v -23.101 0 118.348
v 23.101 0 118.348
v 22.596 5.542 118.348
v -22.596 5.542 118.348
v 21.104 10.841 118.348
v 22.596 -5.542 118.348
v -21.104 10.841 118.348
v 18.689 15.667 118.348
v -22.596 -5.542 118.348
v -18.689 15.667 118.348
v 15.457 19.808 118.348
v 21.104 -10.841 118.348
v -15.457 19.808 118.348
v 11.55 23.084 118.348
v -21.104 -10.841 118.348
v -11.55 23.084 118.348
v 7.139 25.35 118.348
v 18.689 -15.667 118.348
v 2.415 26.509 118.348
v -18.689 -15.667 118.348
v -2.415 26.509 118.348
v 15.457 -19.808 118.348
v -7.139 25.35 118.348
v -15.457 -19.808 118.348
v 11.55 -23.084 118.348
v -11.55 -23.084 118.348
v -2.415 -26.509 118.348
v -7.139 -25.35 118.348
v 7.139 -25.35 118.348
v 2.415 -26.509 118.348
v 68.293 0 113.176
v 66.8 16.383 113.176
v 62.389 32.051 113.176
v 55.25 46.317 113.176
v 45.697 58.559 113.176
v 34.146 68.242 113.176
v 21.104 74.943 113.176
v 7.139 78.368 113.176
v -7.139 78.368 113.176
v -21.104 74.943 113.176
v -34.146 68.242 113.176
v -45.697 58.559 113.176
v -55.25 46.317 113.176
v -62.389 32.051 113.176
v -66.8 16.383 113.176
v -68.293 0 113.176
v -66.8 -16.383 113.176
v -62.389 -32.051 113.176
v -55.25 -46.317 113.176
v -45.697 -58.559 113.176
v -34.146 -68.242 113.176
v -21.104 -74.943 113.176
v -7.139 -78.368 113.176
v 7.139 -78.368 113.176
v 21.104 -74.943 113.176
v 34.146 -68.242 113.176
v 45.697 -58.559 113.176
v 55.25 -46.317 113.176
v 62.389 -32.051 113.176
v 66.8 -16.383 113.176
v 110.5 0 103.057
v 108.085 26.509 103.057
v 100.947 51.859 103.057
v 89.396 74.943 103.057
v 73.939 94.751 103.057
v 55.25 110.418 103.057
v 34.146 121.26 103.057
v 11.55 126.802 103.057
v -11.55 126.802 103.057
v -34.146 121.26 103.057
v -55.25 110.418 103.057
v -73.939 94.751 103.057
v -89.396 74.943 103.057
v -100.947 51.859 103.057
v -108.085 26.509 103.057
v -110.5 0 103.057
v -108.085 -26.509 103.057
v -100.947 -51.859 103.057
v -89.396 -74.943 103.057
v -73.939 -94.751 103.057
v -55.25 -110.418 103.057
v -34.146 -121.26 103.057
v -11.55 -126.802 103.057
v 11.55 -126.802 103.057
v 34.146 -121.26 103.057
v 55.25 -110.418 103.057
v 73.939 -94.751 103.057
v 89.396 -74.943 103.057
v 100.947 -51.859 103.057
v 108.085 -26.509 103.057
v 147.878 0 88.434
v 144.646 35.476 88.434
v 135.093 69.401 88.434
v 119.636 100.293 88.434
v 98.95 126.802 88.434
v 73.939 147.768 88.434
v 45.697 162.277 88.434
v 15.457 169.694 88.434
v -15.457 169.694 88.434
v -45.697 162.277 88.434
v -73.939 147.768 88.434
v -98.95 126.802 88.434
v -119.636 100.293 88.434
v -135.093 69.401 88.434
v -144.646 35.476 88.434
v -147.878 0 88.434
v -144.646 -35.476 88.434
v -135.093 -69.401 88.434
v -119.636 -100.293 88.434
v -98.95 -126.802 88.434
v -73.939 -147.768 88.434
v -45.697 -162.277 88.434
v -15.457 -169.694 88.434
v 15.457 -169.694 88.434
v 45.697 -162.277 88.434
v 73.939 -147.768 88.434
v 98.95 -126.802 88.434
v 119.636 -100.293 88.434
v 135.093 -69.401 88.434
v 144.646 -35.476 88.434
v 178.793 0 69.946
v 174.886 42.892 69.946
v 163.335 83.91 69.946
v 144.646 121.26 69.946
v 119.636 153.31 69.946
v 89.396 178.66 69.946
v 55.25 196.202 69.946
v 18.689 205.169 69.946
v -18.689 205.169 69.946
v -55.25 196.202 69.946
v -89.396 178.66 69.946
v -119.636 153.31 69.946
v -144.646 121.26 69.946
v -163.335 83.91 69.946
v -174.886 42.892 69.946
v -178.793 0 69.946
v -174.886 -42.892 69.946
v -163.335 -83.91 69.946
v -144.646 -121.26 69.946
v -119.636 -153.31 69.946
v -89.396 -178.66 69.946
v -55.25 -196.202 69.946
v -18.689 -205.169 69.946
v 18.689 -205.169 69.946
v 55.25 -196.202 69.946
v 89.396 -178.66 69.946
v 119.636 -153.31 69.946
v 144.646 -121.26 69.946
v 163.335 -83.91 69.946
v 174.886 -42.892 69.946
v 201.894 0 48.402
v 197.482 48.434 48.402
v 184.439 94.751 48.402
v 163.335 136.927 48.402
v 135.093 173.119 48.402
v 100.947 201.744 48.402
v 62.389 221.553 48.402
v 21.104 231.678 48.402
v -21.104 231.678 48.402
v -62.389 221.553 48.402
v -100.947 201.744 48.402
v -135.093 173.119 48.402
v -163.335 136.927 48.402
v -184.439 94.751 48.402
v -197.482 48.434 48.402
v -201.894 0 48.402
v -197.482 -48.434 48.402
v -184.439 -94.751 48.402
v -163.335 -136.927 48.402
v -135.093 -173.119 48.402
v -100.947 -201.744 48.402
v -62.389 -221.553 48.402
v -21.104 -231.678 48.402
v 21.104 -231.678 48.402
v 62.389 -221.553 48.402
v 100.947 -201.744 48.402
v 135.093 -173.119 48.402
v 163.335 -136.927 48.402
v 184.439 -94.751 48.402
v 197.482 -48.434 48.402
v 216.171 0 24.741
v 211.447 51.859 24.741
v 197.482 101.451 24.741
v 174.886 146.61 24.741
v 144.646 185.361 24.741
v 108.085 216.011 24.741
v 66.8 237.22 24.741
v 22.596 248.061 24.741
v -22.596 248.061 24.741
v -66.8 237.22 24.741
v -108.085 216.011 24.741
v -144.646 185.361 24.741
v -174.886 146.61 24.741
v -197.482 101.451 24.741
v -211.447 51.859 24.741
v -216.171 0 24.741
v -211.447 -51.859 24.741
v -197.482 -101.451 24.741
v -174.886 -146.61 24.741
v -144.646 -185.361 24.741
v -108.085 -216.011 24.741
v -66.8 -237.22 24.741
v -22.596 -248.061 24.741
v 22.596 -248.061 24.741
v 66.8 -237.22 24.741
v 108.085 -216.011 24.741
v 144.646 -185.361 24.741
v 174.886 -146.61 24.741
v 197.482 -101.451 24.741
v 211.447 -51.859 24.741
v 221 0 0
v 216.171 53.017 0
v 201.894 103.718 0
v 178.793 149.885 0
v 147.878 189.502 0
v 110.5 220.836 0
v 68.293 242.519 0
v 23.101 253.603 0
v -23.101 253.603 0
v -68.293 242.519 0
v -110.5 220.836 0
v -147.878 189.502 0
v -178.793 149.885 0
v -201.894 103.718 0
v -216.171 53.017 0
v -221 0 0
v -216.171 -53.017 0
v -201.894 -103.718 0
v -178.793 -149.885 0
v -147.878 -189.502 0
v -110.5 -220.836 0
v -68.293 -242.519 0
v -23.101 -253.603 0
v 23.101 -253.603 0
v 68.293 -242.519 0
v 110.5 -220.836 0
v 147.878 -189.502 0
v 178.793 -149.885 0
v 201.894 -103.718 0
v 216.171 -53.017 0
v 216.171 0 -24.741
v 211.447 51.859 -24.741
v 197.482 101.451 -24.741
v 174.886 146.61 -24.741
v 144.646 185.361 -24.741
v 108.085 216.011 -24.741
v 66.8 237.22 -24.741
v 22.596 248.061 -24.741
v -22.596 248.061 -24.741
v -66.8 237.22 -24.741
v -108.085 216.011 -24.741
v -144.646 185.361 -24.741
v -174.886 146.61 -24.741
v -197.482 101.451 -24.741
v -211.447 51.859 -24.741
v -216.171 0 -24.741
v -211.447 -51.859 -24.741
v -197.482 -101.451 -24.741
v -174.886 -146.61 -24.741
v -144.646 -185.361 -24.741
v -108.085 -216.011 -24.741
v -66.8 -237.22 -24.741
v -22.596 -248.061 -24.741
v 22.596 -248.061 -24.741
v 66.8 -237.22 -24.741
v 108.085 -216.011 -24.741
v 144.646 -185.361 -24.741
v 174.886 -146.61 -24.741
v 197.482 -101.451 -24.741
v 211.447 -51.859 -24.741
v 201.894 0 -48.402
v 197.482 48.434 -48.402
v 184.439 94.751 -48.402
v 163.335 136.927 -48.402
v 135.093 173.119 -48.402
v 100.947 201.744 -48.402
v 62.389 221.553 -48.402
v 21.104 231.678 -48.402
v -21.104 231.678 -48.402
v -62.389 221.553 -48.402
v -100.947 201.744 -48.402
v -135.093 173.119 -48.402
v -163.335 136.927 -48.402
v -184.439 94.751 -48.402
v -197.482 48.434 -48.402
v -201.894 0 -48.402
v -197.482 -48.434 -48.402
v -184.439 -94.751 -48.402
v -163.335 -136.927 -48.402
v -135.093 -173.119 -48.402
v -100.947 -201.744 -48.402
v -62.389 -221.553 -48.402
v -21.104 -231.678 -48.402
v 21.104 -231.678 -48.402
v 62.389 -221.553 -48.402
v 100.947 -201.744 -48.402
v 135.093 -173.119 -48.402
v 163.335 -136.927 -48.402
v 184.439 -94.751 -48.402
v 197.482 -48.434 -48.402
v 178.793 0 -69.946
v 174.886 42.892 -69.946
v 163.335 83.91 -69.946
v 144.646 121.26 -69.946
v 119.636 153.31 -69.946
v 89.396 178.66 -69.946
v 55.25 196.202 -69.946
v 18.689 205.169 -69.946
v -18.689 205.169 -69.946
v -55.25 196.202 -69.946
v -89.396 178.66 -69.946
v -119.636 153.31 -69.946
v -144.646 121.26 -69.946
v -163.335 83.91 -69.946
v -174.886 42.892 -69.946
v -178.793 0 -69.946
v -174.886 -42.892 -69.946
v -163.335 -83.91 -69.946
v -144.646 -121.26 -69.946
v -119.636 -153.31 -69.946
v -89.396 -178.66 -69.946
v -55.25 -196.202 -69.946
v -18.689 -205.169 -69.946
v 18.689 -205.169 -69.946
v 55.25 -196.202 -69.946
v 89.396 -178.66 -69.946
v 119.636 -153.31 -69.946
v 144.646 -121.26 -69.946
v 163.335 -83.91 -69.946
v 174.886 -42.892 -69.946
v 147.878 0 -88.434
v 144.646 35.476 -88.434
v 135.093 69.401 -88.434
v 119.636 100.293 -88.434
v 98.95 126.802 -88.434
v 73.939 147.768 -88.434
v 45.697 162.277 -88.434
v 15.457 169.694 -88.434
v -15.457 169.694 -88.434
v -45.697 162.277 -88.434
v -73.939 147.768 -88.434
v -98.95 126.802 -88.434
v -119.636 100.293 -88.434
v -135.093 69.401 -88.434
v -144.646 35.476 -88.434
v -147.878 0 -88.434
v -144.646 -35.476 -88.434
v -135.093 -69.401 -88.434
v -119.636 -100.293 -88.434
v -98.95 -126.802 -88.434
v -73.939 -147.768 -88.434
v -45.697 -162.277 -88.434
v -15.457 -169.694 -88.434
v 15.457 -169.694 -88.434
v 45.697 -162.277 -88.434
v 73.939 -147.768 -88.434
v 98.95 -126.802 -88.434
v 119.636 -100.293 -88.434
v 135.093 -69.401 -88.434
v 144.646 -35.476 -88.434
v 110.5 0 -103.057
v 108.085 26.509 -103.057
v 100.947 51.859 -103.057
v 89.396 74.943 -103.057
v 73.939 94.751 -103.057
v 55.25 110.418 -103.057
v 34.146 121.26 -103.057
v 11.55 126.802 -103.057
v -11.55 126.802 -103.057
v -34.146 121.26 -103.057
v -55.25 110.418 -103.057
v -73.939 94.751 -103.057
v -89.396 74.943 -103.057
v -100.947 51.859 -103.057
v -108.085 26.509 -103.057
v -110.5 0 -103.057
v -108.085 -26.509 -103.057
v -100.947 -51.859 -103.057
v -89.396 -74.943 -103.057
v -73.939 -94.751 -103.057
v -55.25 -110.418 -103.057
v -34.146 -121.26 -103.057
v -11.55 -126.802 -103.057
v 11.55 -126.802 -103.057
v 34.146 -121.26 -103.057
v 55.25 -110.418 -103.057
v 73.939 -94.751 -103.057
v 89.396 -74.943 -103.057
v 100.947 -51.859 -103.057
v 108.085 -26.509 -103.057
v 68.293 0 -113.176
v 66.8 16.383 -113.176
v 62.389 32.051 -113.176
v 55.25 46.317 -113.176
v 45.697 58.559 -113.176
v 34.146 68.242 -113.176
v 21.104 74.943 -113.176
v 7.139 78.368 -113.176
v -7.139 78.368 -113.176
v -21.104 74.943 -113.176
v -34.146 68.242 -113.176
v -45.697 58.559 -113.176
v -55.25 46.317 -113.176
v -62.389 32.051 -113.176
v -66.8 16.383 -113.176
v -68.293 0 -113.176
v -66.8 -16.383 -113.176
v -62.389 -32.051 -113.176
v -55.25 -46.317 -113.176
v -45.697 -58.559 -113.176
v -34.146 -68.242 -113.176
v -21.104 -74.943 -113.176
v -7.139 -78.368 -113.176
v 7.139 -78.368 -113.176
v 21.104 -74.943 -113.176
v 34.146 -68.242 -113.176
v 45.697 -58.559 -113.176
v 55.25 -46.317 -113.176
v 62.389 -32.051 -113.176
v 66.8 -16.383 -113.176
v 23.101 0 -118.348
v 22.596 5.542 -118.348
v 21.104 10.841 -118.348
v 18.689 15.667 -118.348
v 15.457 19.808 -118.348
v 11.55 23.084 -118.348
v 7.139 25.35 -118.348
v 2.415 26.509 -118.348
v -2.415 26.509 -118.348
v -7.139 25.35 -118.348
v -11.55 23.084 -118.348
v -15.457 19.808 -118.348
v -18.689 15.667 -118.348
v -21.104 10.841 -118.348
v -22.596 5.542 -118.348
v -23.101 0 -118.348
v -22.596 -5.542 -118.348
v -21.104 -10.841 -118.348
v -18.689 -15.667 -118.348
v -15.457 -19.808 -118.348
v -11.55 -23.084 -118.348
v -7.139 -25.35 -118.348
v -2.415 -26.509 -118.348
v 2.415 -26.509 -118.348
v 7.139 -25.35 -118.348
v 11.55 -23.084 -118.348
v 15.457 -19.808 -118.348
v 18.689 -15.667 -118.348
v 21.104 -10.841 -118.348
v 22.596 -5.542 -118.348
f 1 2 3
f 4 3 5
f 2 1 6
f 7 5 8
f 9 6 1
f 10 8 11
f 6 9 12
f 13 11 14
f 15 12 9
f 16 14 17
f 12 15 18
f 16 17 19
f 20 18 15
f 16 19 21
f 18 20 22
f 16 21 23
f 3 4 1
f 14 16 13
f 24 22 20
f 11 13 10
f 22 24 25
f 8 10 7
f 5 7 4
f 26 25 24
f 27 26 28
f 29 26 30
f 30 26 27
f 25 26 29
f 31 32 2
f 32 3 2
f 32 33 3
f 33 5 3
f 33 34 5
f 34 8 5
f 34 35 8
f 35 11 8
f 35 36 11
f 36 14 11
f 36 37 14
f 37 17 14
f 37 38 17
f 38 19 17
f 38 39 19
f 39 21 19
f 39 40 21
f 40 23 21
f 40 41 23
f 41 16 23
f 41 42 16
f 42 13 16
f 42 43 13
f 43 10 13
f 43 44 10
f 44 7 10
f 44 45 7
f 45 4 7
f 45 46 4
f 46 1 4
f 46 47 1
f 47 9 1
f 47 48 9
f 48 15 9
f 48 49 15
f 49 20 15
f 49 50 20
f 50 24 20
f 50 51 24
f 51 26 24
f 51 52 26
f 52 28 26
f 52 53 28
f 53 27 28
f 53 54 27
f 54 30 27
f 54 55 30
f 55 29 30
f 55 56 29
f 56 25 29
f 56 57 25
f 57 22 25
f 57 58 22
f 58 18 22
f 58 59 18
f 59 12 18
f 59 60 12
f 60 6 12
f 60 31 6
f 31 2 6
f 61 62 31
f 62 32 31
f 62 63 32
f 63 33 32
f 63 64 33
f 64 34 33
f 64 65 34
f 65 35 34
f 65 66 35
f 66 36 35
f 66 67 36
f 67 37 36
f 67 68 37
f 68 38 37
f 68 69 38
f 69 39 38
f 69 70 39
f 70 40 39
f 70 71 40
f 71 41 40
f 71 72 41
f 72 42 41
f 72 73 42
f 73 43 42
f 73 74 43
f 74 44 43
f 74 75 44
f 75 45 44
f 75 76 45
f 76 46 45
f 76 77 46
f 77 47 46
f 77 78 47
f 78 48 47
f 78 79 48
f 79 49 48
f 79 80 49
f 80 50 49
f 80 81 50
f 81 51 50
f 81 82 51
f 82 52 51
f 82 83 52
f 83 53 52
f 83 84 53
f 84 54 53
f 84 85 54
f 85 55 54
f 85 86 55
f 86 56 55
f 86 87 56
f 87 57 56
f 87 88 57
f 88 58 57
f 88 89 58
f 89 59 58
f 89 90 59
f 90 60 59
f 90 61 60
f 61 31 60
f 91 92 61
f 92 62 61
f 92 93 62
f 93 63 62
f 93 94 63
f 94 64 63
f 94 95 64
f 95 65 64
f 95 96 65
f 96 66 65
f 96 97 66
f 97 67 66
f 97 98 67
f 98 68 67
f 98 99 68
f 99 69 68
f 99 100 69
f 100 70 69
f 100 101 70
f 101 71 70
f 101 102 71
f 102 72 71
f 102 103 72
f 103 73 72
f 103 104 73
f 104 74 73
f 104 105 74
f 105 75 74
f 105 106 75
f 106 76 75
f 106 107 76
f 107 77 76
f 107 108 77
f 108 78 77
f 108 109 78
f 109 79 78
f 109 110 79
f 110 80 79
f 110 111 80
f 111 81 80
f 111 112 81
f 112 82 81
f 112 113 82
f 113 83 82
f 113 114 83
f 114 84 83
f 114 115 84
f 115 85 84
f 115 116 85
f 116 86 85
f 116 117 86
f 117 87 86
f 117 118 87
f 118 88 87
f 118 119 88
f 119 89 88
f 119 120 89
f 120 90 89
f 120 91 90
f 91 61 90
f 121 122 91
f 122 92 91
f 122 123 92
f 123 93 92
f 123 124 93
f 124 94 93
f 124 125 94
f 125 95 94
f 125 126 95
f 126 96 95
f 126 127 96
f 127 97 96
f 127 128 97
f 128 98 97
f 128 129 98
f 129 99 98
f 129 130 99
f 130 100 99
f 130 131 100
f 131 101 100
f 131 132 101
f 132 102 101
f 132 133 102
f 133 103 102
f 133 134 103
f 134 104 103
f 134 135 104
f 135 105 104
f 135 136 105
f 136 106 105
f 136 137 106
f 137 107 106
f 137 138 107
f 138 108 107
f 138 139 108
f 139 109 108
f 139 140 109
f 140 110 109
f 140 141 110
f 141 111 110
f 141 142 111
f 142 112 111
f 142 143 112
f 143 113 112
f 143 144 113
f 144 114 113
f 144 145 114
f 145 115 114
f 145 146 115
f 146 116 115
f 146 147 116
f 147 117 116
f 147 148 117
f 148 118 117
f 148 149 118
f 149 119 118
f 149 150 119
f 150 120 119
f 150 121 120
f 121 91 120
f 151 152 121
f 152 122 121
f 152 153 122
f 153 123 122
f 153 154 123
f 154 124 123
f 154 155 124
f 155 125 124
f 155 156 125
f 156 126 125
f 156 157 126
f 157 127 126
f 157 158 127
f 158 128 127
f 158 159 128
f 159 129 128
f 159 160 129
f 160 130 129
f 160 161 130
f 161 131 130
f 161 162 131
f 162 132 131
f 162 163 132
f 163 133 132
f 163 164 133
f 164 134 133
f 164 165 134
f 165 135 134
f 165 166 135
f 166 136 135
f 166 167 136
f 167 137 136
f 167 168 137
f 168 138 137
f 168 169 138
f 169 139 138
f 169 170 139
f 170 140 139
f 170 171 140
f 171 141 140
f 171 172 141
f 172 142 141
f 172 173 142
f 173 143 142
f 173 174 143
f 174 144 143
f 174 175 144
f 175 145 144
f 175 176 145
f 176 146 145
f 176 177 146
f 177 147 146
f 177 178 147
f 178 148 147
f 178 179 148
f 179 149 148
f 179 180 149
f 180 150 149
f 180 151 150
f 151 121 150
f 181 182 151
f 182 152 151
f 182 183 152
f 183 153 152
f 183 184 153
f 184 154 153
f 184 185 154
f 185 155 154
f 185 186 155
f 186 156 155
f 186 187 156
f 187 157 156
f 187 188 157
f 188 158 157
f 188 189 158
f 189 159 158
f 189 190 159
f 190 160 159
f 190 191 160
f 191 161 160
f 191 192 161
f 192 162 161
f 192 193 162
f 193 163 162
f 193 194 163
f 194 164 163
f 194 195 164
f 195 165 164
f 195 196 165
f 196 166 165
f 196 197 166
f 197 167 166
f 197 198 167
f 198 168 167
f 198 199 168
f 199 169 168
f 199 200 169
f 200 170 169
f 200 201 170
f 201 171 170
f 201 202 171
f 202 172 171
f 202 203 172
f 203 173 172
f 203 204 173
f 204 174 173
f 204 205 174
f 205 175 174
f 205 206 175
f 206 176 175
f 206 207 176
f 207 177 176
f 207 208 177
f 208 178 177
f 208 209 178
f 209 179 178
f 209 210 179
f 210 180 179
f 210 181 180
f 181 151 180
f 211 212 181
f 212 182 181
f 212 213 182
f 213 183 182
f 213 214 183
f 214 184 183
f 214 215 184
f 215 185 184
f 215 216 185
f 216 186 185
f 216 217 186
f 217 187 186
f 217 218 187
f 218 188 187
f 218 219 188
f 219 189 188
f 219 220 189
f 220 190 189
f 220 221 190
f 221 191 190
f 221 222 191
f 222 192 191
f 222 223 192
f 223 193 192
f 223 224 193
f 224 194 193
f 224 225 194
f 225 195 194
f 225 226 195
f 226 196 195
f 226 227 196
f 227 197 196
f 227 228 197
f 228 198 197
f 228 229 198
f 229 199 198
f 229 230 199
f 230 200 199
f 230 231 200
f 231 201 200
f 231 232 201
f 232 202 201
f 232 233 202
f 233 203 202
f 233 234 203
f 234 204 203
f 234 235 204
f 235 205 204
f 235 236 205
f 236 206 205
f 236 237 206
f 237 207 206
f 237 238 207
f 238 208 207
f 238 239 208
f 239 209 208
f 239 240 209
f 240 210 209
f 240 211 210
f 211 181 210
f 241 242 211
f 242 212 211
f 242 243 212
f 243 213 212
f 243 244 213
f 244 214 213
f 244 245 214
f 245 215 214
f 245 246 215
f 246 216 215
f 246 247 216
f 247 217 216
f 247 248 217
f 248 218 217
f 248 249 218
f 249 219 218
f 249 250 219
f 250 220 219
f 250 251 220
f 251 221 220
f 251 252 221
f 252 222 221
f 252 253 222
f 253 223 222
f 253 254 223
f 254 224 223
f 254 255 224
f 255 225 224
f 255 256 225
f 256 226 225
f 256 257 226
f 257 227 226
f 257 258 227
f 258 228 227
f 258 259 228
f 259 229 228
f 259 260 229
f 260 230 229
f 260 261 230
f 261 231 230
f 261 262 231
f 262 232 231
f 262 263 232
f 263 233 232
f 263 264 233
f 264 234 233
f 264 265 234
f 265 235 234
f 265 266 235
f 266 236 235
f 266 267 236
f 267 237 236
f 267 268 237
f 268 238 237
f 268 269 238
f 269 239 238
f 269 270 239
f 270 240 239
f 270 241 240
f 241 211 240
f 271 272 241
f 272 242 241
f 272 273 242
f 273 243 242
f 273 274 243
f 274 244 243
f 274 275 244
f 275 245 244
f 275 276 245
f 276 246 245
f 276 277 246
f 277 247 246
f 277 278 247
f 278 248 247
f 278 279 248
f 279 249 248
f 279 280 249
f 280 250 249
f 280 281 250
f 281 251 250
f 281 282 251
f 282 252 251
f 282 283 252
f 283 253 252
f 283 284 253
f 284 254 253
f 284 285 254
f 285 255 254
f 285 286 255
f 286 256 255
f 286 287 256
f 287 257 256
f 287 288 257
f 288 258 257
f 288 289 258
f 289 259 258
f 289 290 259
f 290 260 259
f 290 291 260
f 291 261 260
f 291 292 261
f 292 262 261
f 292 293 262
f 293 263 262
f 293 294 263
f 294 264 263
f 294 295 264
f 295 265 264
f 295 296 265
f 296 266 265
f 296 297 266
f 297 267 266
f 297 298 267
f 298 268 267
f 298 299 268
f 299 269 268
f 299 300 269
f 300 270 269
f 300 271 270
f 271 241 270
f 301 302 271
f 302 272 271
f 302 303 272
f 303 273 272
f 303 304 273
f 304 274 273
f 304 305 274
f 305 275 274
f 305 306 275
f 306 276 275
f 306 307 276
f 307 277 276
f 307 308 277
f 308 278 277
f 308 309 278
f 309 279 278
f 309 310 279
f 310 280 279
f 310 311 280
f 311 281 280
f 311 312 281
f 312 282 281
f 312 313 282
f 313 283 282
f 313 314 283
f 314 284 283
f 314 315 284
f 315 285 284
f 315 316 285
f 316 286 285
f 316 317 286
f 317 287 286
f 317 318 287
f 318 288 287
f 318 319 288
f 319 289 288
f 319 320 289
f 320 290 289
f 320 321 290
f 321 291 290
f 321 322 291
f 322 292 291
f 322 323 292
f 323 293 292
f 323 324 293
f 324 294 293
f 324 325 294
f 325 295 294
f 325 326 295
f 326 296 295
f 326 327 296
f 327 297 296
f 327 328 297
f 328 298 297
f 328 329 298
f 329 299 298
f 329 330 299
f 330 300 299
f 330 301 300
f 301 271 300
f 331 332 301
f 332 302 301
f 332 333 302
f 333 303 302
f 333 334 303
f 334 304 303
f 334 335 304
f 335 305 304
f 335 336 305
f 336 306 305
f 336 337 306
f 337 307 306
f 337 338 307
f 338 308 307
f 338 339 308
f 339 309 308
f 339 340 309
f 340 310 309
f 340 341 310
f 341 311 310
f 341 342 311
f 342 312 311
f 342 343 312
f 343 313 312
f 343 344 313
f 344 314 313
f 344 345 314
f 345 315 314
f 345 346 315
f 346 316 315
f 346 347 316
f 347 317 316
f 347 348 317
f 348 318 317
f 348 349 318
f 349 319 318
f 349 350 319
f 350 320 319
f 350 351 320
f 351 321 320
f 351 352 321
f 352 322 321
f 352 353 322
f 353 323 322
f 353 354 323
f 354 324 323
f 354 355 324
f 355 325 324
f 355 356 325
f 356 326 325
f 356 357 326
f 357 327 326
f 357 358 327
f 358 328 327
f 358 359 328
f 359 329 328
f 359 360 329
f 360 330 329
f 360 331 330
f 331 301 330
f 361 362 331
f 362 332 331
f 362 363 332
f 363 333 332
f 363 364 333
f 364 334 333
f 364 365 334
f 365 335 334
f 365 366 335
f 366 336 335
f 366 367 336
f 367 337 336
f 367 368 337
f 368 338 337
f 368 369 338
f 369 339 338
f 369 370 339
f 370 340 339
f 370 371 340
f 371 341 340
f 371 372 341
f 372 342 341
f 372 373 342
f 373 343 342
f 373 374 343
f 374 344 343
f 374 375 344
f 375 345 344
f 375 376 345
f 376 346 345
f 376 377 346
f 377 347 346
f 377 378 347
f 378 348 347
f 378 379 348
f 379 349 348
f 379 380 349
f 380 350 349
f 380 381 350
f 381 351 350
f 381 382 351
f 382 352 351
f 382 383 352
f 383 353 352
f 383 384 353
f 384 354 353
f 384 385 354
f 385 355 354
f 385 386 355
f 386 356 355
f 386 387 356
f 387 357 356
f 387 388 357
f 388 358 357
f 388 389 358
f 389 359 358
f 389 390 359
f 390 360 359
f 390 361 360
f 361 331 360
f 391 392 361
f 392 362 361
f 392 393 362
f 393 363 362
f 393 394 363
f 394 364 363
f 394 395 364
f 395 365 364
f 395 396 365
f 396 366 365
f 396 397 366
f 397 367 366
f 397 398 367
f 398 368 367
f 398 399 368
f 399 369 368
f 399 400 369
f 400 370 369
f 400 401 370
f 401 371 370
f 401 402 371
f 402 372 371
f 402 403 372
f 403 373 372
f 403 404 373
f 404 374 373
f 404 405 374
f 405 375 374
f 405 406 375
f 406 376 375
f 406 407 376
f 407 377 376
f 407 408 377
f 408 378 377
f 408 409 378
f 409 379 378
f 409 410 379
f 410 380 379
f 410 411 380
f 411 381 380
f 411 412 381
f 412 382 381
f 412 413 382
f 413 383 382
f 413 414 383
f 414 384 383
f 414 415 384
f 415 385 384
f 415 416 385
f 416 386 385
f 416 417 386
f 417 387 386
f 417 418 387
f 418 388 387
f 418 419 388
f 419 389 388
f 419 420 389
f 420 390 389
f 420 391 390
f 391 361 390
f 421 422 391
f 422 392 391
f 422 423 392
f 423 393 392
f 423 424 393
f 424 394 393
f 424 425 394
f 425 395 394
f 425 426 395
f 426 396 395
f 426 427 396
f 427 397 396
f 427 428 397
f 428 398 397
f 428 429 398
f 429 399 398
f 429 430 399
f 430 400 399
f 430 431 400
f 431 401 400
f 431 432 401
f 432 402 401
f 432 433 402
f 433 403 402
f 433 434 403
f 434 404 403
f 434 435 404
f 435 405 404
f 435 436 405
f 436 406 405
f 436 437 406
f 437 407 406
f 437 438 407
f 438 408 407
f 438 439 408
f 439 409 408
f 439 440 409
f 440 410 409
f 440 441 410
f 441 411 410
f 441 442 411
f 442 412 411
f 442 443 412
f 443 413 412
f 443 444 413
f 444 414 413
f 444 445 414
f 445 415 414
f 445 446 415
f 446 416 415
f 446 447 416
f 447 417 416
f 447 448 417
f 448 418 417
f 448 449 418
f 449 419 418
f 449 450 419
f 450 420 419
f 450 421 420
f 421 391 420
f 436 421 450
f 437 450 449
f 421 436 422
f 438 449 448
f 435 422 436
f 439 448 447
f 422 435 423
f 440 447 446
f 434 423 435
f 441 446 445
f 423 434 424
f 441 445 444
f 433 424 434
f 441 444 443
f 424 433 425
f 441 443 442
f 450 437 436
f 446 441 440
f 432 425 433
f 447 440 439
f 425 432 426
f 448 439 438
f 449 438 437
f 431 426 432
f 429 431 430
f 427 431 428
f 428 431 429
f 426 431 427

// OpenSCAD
// Generated by SolidPython 1.0.1 on 2020-07-29 00:46:51


scale(v = [13, 15, 7]) {
	sphere(r = 17);
}
/***********************************************
*********      SolidPython code:      **********
************************************************
 
# import packages: SolidPython
from solid import *
from solid.utils import *
from itertools import chain, combinations, permutations


class Resize:

    def __init__(self, scad_file):
        self.scad_file = scad_file
        #self.scad_file = import_scad(scad_file)
        # cone/cylinder param:
        self.r1 = 0
        self.r2 = 0
        self.h = 0
        # rectangular prism param:
        self.w = 0
        self.l = 0
        # ellipse param:
        self.r = 0

    # import OpenScad code (file name corresponds to shape)


    # classify shape + parameters
    def assign(self, param1, param2, param3):
        if self.scad_file == 'cone.scad':
            self.r1 = param1
            self.r2 = param2
            self.h = param3
        elif self.scad_file == 'cylinder.scad':
            self.r1 = param1
            self.r2 = param2
            self.h = param3
        elif self.scad_file == 'rectangularPrism.scad':
            self.h = param1
            self.l = param2
            self.w = param3
        else:
            self.r = param1
            self.h = param2

    # resize parameters
    def iterate(self):
        x = range(3, 20, 2)
        i = 1
        if self.scad_file == 'cone.scad':
            tempList = list(permutations(x, 2))
            for temp in tempList:
                param1 = temp[0]
                param2 = temp[1]
                filepath = 'produced_scad_files/' + 'cone' + str(param1) + '_' + str(param2) + '_' + '.scad'
                scad_render_to_file(cylinder(h=param1, r1=param2, r2=0), filepath)

        elif self.scad_file == 'cylinder.scad':
            tempList = list(permutations(x, 3))
            for temp in tempList:
                param1 = temp[0]
                param2 = temp[1]
                filepath = 'produced_scad_files/' + 'cylinder' + str(param1) + '_' + str(param2) + '_' + '.scad'
                scad_render_to_file(cylinder(h=param1, r1=param2, r2=param2), filepath)

        elif self.scad_file == 'rectangularPrism.scad':
            tempList = list(permutations(x, 3))
            for temp in tempList:
                param1 = temp[0]
                param2 = temp[1]
                param3 = temp[2]
                filepath = 'produced_scad_files/' + 'rectangularPrism' + str(param1) + '_' + str(param2) + '_' + str(
                    param3) + '.scad'
                scad_render_to_file(cube(size=(param1, param2, param3)), filepath)

        elif self.scad_file == 'ellipse.scad':
            tempList = list(permutations(x, 4))
            for temp in tempList:
                param1 = temp[0]
                param2 = temp[1]
                param3 = temp[2]
                param4 = temp[3]
                filepath = 'produced_scad_files/' + 'ellipse' + str(param1) + '_' + str(param2) + '_' + str(param3) + '_' + str(param4) + '.scad'
                scad_render_to_file(scale([param1, param2, param3])(sphere(r=param4)), filepath)

    def render_to_scadfile(self):
        scad_render_to_file(scad, 'example.scad') 
 
************************************************/
